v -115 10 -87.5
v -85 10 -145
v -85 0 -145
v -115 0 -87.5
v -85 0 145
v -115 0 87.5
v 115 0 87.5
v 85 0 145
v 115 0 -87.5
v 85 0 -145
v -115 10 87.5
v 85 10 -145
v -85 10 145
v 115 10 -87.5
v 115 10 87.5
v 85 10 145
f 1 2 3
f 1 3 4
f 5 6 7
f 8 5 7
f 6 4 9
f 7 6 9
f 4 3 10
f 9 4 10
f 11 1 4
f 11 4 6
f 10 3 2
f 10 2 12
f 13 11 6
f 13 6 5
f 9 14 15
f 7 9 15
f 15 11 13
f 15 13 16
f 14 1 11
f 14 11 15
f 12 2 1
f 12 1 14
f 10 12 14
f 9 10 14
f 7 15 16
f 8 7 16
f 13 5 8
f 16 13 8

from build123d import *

# Parameters (mm, degrees)
SKETCH1_W           = 310
SKETCH1_H           = 290
BOSS_EXTRUDE1_DEPTH = 10
CUT_EXTRUDE1_DEPTH  = 213.485293609


with BuildPart() as part:
    # Sketch1 → Boss-Extrude1 (new body)
    with BuildSketch(Plane(origin=(0, 0, 0), x_dir=(1, 0, 0), z_dir=(0, 1, 0))):
        Rectangle(SKETCH1_W, SKETCH1_H)
    extrude(amount=BOSS_EXTRUDE1_DEPTH)

    # Sketch2 → Cut-Extrude1 (cut, through all)
    with BuildSketch(Plane(origin=(0, 10, 0), x_dir=(1, 0, 0), z_dir=(0, 1, 0))):
        Polygon((-85.000000005, 145), (-115.000000006, 87.499999999), (-115.000000006, -87.500000001), (-85, -145), (-155, -145), (-155.000000005, 145), align=None)
        Polygon((155, -145), (155.000000005, 145), (85.000000005, 145), (115.000000006, 87.499999999), (115.000000006, -87.500000001), (85, -145), align=None)
    extrude(amount=-CUT_EXTRUDE1_DEPTH, mode=Mode.SUBTRACT)


solid = part.part
